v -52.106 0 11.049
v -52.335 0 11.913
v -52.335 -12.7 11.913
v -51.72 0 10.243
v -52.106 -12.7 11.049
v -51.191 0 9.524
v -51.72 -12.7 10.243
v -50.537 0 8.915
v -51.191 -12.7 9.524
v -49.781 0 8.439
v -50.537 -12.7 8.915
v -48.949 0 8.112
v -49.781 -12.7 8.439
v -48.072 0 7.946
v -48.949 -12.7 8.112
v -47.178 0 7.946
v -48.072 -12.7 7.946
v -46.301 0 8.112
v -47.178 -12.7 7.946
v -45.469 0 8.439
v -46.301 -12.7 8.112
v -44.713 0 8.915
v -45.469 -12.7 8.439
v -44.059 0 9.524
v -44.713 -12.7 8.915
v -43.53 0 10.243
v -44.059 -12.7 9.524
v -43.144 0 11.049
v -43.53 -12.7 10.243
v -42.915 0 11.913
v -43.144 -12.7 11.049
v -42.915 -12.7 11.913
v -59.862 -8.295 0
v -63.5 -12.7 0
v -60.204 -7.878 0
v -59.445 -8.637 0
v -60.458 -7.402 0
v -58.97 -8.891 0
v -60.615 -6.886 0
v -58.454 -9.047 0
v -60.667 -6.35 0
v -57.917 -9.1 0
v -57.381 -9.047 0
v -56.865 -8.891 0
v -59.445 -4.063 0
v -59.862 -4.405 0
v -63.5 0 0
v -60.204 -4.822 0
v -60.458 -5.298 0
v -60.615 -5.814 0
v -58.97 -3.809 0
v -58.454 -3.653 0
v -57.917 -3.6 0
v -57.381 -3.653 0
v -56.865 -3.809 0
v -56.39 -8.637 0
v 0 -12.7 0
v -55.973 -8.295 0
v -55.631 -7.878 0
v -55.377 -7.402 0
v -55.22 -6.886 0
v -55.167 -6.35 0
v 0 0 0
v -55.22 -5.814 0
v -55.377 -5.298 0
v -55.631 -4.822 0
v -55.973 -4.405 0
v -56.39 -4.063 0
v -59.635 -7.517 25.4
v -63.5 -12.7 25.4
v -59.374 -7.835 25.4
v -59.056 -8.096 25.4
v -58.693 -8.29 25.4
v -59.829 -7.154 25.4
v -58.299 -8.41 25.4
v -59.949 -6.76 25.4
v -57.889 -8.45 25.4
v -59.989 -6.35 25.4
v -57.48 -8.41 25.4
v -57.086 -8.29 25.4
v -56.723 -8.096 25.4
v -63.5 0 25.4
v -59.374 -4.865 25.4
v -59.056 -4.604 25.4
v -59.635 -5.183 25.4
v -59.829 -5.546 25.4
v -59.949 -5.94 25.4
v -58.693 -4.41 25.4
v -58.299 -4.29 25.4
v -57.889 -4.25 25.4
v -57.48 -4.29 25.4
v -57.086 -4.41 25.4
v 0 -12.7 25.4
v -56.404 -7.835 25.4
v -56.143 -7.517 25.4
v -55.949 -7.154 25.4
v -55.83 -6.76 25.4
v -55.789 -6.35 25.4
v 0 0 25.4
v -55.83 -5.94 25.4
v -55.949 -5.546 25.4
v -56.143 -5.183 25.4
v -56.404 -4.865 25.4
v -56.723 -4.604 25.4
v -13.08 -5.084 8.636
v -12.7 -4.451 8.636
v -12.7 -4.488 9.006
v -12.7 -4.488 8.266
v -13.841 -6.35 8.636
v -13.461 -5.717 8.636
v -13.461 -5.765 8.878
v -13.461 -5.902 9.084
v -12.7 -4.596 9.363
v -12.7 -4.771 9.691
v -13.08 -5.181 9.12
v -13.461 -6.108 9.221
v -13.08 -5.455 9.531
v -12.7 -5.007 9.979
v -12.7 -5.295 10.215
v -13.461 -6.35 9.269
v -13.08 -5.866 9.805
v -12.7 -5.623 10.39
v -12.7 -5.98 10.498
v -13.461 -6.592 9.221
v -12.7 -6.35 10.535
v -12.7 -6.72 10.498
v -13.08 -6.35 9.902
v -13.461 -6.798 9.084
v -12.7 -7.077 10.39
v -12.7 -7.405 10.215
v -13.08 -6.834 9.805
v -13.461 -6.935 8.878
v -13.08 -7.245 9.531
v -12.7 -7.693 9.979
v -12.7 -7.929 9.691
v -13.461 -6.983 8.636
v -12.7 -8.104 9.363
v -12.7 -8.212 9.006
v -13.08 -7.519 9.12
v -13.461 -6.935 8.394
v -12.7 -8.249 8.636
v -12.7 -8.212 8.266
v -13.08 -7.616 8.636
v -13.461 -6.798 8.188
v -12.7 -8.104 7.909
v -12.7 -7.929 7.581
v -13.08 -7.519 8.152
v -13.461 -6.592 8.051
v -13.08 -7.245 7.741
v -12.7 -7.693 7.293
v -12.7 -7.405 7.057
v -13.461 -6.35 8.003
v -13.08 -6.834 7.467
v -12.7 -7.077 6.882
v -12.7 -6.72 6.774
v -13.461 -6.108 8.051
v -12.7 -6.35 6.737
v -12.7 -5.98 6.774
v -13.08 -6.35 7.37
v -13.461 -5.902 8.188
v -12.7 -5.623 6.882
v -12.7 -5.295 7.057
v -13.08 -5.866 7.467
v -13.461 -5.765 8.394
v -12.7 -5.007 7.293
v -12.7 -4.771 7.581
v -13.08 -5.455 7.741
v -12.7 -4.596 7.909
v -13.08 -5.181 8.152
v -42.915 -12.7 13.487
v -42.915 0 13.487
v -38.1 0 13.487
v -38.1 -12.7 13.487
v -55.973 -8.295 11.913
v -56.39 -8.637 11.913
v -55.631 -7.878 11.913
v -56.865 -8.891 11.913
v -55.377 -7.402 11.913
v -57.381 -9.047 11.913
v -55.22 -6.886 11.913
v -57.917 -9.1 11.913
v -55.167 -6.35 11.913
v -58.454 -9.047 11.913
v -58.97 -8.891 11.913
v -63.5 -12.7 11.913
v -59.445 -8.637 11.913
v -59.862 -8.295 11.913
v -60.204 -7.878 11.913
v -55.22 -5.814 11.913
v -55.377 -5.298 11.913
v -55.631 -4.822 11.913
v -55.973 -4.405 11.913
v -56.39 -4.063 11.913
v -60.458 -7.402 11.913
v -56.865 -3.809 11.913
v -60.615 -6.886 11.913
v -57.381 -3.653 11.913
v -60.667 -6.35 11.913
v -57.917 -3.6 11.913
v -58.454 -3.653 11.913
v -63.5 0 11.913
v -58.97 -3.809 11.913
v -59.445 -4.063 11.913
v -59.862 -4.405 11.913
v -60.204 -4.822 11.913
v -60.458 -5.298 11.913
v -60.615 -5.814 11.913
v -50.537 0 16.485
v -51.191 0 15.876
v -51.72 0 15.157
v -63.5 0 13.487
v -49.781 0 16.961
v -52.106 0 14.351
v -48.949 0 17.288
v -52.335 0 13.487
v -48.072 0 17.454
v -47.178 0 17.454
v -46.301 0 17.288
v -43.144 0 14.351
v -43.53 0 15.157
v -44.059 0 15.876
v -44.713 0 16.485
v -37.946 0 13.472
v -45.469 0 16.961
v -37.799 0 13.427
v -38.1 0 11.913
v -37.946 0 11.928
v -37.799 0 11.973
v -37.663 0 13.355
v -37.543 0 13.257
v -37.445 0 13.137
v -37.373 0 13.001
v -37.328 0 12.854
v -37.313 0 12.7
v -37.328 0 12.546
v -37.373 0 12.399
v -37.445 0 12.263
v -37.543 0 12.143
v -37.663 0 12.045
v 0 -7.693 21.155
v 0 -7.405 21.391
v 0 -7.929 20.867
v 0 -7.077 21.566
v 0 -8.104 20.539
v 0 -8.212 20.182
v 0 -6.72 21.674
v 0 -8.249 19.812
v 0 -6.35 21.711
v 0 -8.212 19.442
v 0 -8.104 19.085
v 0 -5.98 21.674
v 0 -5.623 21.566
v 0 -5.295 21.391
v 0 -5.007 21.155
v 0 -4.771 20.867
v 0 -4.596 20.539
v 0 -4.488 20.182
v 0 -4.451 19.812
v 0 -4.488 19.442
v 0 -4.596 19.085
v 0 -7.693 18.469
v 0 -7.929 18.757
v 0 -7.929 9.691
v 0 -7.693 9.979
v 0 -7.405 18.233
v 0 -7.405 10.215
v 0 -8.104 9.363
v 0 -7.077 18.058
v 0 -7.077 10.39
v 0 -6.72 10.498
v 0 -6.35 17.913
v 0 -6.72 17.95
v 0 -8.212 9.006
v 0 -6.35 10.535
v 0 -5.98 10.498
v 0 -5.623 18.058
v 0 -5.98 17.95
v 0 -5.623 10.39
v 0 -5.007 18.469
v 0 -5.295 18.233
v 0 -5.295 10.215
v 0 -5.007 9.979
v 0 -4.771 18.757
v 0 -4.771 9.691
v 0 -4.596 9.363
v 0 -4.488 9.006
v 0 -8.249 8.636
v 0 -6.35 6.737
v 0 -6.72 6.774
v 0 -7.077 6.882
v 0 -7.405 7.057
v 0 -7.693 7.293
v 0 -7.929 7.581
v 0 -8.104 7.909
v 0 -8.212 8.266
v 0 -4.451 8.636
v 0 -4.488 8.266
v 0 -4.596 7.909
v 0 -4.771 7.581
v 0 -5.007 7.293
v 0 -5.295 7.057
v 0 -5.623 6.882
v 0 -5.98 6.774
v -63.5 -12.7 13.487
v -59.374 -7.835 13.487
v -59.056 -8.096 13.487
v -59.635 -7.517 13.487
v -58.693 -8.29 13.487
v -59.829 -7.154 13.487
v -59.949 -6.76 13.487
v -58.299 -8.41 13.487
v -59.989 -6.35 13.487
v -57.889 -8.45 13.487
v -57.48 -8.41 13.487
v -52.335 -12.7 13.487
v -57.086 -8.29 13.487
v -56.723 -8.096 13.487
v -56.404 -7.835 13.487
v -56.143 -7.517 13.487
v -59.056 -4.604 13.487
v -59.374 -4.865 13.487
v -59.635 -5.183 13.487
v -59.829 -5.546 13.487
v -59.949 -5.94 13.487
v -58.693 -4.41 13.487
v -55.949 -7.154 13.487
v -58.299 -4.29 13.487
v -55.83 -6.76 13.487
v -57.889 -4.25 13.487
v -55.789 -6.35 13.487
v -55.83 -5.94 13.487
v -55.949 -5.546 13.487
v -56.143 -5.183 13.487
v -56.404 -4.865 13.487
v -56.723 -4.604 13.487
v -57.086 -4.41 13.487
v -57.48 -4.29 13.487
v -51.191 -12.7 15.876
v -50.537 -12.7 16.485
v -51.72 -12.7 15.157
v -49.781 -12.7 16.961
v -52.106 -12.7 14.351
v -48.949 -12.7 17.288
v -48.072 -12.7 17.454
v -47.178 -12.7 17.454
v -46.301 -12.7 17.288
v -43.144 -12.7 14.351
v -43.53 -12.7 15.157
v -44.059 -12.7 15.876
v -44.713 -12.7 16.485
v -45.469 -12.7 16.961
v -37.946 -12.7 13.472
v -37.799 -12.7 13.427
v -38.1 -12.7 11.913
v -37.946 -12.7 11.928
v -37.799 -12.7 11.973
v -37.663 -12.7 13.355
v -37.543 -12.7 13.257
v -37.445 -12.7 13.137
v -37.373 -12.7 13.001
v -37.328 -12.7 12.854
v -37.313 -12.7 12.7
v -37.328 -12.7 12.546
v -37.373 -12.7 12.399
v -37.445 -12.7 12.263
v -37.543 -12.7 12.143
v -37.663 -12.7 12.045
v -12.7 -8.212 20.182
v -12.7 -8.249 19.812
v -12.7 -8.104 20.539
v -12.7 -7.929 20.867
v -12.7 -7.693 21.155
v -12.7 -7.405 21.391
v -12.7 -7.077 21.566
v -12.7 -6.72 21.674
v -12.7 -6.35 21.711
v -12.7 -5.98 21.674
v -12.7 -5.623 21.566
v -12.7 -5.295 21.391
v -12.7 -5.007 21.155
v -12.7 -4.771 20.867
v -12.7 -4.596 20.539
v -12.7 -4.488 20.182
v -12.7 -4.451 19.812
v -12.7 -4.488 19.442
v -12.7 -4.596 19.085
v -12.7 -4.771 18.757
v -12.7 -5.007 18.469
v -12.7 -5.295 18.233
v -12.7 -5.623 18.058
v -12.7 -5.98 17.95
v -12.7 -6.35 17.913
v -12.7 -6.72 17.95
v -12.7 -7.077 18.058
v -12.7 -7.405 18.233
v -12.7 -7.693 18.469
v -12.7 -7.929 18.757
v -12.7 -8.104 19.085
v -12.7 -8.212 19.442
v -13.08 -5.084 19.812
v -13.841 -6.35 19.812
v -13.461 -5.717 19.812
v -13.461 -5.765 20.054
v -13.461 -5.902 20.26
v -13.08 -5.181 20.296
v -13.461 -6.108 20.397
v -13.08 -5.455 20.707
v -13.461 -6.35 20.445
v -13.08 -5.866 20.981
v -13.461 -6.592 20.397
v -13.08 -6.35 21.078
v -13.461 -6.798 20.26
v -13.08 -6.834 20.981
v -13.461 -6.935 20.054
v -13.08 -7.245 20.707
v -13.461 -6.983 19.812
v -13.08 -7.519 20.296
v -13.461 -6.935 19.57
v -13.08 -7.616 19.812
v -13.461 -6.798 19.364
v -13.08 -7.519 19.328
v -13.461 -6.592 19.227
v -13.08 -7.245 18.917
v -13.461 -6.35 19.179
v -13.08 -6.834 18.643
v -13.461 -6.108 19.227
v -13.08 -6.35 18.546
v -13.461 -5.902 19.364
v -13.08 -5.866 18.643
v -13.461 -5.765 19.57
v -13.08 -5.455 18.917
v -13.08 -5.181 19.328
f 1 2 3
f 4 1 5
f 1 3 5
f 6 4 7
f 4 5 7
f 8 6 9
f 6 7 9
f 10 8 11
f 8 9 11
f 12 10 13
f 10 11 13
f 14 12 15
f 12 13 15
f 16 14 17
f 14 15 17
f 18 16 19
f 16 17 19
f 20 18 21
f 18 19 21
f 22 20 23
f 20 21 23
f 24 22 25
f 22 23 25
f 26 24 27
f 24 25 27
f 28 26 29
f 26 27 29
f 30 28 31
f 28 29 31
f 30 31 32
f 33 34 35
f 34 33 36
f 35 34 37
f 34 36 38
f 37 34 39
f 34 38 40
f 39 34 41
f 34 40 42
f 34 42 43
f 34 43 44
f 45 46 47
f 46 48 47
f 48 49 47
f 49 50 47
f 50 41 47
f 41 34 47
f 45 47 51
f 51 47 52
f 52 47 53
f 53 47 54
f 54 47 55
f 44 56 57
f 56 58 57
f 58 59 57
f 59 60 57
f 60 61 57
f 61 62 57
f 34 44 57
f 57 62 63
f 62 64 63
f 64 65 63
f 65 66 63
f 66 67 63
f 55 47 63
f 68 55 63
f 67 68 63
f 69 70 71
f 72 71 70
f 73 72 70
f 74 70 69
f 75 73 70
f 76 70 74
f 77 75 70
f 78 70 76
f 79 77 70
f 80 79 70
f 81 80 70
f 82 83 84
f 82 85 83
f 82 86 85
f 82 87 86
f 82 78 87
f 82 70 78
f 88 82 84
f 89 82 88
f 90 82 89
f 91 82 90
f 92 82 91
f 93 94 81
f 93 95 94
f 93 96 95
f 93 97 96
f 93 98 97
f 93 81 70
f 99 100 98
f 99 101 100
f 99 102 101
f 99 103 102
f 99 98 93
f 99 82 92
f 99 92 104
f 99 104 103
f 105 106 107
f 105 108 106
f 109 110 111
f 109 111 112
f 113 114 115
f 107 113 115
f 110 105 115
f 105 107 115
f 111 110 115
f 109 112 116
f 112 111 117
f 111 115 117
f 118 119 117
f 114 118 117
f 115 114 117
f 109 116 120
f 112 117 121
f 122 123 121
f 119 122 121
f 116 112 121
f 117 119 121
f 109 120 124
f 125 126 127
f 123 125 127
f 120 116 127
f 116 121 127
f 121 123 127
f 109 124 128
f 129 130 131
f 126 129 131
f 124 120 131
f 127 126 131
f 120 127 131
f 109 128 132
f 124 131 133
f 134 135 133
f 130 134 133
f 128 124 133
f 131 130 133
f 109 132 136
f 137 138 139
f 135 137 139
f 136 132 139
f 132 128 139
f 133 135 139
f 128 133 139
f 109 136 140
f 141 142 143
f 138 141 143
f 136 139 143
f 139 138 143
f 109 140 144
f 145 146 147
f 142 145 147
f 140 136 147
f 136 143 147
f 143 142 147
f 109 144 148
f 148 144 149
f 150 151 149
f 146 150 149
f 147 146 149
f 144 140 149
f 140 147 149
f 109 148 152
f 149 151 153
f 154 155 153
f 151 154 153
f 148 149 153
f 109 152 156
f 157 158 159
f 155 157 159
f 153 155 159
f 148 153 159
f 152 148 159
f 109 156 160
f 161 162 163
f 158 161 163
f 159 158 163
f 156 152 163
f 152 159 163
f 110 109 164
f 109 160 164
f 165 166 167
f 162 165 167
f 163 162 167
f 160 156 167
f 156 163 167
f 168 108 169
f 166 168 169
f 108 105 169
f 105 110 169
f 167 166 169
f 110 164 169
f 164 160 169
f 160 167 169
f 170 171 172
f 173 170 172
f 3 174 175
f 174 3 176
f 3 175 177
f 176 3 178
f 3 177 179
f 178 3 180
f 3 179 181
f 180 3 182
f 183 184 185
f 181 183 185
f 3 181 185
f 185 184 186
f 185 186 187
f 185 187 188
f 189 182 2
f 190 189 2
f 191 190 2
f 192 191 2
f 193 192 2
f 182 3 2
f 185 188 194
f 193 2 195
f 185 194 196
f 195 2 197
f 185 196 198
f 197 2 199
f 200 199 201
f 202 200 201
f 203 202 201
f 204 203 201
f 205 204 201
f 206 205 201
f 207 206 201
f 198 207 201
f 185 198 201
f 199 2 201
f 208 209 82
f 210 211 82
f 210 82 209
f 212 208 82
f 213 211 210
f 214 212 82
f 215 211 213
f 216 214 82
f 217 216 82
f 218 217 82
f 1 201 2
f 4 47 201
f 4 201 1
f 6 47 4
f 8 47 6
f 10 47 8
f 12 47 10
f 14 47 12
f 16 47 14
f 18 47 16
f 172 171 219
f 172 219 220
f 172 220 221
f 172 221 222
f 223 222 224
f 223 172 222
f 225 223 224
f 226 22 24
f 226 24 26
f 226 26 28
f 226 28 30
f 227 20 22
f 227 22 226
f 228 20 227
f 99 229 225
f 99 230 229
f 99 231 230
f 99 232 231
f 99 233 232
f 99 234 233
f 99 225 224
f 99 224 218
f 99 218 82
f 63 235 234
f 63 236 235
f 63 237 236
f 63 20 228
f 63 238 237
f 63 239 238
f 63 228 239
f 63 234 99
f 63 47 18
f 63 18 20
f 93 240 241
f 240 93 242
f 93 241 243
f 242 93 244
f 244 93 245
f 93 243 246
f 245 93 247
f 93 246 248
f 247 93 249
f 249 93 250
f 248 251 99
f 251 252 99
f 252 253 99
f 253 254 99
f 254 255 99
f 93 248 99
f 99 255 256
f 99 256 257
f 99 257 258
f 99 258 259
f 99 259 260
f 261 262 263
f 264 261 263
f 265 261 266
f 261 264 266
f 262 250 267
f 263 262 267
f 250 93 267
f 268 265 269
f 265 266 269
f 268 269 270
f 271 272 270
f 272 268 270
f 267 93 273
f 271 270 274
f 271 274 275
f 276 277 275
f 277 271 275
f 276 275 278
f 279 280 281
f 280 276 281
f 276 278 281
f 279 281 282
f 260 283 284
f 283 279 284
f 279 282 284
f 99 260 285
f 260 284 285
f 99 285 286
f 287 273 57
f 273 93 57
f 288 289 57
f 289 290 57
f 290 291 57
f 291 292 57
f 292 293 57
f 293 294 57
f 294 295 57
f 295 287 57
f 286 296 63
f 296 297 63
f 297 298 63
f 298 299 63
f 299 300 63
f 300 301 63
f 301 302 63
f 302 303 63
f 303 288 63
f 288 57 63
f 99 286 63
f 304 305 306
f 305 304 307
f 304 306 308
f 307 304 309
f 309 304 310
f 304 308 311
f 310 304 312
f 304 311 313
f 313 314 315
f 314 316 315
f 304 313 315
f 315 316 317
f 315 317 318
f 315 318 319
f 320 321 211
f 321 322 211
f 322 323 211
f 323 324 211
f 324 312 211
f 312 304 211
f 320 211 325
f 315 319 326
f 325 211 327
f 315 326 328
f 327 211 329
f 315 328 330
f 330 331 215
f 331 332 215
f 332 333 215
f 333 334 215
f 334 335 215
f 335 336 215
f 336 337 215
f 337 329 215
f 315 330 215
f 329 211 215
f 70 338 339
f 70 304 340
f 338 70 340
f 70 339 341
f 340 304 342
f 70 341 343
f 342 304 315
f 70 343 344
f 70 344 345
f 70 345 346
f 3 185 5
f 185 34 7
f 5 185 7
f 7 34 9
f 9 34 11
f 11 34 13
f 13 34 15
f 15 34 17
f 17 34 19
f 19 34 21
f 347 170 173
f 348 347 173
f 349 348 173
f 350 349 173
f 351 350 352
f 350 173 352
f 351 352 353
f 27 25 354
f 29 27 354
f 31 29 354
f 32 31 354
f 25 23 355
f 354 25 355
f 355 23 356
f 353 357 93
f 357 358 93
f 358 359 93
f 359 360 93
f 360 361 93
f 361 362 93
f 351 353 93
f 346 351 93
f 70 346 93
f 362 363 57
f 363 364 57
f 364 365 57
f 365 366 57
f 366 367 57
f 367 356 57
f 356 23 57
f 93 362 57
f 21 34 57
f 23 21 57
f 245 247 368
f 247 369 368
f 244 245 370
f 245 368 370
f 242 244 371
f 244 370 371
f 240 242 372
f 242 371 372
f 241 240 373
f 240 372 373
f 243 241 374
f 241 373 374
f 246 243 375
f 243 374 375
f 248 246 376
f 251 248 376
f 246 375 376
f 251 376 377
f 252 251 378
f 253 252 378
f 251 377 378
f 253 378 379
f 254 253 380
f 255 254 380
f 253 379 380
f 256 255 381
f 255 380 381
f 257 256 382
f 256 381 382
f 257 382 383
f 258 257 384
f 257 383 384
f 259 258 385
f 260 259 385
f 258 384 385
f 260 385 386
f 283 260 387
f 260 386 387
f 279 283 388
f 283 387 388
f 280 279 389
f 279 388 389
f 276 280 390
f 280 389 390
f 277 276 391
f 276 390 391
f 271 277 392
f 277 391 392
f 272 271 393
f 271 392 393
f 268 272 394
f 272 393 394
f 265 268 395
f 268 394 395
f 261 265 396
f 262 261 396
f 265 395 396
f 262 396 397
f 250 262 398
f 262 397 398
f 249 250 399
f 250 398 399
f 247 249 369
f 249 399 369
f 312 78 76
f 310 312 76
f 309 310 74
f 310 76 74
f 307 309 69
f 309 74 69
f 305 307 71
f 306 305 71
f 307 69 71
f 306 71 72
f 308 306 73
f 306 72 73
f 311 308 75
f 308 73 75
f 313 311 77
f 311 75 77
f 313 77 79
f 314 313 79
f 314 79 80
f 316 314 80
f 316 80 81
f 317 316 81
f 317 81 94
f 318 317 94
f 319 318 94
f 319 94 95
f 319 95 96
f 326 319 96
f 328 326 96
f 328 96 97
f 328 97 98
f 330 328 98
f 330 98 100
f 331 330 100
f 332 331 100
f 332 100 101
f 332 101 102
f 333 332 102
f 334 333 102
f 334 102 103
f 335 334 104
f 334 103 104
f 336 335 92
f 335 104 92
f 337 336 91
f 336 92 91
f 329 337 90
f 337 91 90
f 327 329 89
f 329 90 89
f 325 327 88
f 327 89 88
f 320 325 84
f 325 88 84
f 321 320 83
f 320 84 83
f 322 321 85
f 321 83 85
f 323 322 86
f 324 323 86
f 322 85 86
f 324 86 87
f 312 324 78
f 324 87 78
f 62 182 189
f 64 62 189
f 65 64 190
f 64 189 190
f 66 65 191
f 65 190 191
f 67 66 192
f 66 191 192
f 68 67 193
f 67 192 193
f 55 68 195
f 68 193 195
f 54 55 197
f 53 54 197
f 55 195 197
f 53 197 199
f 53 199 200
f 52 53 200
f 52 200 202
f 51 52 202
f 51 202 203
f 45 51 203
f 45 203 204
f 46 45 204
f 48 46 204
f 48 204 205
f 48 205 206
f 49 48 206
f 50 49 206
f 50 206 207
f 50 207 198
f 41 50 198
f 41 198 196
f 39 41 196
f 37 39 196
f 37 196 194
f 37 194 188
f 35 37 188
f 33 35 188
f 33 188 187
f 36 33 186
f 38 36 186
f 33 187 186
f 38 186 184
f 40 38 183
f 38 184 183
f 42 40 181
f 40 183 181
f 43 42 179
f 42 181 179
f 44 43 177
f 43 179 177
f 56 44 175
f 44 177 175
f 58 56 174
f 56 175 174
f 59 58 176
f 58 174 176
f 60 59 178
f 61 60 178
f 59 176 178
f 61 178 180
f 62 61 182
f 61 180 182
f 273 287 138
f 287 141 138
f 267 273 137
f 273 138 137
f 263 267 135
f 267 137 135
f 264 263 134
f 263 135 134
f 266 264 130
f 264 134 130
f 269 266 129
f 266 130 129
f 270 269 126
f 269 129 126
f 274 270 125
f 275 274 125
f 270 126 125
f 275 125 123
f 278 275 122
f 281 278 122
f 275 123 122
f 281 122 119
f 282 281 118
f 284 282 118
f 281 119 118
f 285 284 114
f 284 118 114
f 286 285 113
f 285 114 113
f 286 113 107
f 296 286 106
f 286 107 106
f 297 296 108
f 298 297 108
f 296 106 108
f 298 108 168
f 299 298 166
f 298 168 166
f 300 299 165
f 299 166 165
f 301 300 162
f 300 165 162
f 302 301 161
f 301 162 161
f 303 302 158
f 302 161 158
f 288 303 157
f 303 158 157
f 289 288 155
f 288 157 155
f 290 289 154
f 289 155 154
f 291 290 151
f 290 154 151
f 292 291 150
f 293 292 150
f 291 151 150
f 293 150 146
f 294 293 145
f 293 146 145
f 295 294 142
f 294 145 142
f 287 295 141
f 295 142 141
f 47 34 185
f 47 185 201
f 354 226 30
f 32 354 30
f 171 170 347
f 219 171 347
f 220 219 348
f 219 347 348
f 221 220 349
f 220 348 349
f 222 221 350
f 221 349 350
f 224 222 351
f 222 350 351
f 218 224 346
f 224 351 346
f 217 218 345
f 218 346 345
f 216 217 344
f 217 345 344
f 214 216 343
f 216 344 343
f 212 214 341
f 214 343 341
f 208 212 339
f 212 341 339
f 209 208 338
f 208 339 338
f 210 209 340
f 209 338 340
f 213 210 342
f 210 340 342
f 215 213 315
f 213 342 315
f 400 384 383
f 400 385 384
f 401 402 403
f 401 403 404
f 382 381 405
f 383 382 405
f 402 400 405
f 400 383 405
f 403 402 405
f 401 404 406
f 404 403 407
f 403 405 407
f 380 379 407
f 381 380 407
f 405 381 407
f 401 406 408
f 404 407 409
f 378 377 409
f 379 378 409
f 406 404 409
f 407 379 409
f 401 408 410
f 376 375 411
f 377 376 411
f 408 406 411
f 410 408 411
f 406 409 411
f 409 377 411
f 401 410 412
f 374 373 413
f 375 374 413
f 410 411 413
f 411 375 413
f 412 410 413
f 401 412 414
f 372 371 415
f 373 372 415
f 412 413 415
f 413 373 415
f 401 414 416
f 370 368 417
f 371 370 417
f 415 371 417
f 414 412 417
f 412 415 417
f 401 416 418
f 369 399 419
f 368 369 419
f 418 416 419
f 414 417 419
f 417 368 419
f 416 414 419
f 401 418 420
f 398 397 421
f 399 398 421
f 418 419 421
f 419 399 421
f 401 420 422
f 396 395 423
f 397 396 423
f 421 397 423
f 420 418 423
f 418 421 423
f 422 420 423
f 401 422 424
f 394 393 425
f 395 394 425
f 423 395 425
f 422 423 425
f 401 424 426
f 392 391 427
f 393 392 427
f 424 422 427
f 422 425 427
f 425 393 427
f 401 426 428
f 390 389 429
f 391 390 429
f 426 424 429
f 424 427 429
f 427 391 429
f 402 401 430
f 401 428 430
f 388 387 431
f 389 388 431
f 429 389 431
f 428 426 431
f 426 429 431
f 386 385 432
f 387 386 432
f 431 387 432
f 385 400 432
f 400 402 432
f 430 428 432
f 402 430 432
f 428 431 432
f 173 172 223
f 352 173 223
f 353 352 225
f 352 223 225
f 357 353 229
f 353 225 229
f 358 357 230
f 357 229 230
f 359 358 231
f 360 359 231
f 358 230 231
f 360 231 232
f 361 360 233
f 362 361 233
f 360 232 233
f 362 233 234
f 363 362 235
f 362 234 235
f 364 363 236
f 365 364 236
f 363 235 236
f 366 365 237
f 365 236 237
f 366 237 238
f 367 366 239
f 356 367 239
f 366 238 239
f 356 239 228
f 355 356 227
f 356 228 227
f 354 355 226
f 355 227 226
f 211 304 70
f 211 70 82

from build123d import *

# Parameters (mm, degrees)
F0_W      = 63.5
F0_H      = 12.7
F1_DEPTH  = 25.4
F3_D      = 3.7973
F3_DEPTH  = 12.7
F3_TIP    = 1.1408240143
F4_D      = 3.7973
F4_DEPTH  = 12.7
F4_TIP    = 1.1408240143
F6_D      = 9.5504
F7_DEPTH  = 12.701
F10_D     = 5.5
F10_DEPTH = 11.9136
F12_D     = 4.2


with BuildPart() as f1:
    # F0 (on Top) → F1 (new body)
    with BuildSketch(Plane.XY):
        with Locations((-31.75, -6.35)):
            Rectangle(F0_W, F0_H)
    extrude(amount=F1_DEPTH)

    # F3
    with Locations(Plane.YZ):
        with Locations((-6.35, 19.812)):
            Hole(F3_D / 2, depth=F3_DEPTH)
            with Locations((0, 0, -(F3_DEPTH + F3_TIP / 2))):  # 118° drill point
                Cone(0, F3_D / 2, F3_TIP, mode=Mode.SUBTRACT)

    # F4
    with Locations(Plane.YZ):
        with Locations((-6.35, 8.636)):
            Hole(F4_D / 2, depth=F4_DEPTH)
            with Locations((0, 0, -(F4_DEPTH + F4_TIP / 2))):  # 118° drill point
                Cone(0, F4_D / 2, F4_TIP, mode=Mode.SUBTRACT)

    # F6 (through all)
    with Locations(Plane(origin=(0, 0, 0), x_dir=(-1, 0, 0), z_dir=(0, 1, 0))):
        with Locations((47.625, 12.7)):
            Hole(F6_D / 2)

    # F5 (on face) → F7 (cut, through all)
    with BuildSketch(Plane(origin=(0, 0, 0), x_dir=(-1, 0, 0), z_dir=(0, 1, 0))):
        with BuildLine():
            ThreePointArc((38.1, 13.4874), (37.3126, 12.7), (38.1, 11.9126))
            Line((38.1, 11.9126), (63.5, 11.9126))
            Line((63.5, 11.9126), (63.5, 12.7))
            Line((63.5, 12.7), (63.5, 13.4874))
            Line((63.5, 13.4874), (38.1, 13.4874))
        make_face()
    extrude(amount=-F7_DEPTH, mode=Mode.SUBTRACT)

    # F10 (through all, one way)
    with BuildSketch(Plane.XY.offset(11.9126)):
        with Locations((-57.9174169985, -6.35)):
            Circle(F10_D / 2)
    extrude(amount=-F10_DEPTH, mode=Mode.SUBTRACT)

    # F12 (through all)
    with Locations(Plane(origin=(0, 0, 13.4874), x_dir=(1, 0, 0), z_dir=(0, 0, -1))):
        with Locations((-57.8892030611, 6.35)):
            Hole(F12_D / 2)


solid = f1.part
